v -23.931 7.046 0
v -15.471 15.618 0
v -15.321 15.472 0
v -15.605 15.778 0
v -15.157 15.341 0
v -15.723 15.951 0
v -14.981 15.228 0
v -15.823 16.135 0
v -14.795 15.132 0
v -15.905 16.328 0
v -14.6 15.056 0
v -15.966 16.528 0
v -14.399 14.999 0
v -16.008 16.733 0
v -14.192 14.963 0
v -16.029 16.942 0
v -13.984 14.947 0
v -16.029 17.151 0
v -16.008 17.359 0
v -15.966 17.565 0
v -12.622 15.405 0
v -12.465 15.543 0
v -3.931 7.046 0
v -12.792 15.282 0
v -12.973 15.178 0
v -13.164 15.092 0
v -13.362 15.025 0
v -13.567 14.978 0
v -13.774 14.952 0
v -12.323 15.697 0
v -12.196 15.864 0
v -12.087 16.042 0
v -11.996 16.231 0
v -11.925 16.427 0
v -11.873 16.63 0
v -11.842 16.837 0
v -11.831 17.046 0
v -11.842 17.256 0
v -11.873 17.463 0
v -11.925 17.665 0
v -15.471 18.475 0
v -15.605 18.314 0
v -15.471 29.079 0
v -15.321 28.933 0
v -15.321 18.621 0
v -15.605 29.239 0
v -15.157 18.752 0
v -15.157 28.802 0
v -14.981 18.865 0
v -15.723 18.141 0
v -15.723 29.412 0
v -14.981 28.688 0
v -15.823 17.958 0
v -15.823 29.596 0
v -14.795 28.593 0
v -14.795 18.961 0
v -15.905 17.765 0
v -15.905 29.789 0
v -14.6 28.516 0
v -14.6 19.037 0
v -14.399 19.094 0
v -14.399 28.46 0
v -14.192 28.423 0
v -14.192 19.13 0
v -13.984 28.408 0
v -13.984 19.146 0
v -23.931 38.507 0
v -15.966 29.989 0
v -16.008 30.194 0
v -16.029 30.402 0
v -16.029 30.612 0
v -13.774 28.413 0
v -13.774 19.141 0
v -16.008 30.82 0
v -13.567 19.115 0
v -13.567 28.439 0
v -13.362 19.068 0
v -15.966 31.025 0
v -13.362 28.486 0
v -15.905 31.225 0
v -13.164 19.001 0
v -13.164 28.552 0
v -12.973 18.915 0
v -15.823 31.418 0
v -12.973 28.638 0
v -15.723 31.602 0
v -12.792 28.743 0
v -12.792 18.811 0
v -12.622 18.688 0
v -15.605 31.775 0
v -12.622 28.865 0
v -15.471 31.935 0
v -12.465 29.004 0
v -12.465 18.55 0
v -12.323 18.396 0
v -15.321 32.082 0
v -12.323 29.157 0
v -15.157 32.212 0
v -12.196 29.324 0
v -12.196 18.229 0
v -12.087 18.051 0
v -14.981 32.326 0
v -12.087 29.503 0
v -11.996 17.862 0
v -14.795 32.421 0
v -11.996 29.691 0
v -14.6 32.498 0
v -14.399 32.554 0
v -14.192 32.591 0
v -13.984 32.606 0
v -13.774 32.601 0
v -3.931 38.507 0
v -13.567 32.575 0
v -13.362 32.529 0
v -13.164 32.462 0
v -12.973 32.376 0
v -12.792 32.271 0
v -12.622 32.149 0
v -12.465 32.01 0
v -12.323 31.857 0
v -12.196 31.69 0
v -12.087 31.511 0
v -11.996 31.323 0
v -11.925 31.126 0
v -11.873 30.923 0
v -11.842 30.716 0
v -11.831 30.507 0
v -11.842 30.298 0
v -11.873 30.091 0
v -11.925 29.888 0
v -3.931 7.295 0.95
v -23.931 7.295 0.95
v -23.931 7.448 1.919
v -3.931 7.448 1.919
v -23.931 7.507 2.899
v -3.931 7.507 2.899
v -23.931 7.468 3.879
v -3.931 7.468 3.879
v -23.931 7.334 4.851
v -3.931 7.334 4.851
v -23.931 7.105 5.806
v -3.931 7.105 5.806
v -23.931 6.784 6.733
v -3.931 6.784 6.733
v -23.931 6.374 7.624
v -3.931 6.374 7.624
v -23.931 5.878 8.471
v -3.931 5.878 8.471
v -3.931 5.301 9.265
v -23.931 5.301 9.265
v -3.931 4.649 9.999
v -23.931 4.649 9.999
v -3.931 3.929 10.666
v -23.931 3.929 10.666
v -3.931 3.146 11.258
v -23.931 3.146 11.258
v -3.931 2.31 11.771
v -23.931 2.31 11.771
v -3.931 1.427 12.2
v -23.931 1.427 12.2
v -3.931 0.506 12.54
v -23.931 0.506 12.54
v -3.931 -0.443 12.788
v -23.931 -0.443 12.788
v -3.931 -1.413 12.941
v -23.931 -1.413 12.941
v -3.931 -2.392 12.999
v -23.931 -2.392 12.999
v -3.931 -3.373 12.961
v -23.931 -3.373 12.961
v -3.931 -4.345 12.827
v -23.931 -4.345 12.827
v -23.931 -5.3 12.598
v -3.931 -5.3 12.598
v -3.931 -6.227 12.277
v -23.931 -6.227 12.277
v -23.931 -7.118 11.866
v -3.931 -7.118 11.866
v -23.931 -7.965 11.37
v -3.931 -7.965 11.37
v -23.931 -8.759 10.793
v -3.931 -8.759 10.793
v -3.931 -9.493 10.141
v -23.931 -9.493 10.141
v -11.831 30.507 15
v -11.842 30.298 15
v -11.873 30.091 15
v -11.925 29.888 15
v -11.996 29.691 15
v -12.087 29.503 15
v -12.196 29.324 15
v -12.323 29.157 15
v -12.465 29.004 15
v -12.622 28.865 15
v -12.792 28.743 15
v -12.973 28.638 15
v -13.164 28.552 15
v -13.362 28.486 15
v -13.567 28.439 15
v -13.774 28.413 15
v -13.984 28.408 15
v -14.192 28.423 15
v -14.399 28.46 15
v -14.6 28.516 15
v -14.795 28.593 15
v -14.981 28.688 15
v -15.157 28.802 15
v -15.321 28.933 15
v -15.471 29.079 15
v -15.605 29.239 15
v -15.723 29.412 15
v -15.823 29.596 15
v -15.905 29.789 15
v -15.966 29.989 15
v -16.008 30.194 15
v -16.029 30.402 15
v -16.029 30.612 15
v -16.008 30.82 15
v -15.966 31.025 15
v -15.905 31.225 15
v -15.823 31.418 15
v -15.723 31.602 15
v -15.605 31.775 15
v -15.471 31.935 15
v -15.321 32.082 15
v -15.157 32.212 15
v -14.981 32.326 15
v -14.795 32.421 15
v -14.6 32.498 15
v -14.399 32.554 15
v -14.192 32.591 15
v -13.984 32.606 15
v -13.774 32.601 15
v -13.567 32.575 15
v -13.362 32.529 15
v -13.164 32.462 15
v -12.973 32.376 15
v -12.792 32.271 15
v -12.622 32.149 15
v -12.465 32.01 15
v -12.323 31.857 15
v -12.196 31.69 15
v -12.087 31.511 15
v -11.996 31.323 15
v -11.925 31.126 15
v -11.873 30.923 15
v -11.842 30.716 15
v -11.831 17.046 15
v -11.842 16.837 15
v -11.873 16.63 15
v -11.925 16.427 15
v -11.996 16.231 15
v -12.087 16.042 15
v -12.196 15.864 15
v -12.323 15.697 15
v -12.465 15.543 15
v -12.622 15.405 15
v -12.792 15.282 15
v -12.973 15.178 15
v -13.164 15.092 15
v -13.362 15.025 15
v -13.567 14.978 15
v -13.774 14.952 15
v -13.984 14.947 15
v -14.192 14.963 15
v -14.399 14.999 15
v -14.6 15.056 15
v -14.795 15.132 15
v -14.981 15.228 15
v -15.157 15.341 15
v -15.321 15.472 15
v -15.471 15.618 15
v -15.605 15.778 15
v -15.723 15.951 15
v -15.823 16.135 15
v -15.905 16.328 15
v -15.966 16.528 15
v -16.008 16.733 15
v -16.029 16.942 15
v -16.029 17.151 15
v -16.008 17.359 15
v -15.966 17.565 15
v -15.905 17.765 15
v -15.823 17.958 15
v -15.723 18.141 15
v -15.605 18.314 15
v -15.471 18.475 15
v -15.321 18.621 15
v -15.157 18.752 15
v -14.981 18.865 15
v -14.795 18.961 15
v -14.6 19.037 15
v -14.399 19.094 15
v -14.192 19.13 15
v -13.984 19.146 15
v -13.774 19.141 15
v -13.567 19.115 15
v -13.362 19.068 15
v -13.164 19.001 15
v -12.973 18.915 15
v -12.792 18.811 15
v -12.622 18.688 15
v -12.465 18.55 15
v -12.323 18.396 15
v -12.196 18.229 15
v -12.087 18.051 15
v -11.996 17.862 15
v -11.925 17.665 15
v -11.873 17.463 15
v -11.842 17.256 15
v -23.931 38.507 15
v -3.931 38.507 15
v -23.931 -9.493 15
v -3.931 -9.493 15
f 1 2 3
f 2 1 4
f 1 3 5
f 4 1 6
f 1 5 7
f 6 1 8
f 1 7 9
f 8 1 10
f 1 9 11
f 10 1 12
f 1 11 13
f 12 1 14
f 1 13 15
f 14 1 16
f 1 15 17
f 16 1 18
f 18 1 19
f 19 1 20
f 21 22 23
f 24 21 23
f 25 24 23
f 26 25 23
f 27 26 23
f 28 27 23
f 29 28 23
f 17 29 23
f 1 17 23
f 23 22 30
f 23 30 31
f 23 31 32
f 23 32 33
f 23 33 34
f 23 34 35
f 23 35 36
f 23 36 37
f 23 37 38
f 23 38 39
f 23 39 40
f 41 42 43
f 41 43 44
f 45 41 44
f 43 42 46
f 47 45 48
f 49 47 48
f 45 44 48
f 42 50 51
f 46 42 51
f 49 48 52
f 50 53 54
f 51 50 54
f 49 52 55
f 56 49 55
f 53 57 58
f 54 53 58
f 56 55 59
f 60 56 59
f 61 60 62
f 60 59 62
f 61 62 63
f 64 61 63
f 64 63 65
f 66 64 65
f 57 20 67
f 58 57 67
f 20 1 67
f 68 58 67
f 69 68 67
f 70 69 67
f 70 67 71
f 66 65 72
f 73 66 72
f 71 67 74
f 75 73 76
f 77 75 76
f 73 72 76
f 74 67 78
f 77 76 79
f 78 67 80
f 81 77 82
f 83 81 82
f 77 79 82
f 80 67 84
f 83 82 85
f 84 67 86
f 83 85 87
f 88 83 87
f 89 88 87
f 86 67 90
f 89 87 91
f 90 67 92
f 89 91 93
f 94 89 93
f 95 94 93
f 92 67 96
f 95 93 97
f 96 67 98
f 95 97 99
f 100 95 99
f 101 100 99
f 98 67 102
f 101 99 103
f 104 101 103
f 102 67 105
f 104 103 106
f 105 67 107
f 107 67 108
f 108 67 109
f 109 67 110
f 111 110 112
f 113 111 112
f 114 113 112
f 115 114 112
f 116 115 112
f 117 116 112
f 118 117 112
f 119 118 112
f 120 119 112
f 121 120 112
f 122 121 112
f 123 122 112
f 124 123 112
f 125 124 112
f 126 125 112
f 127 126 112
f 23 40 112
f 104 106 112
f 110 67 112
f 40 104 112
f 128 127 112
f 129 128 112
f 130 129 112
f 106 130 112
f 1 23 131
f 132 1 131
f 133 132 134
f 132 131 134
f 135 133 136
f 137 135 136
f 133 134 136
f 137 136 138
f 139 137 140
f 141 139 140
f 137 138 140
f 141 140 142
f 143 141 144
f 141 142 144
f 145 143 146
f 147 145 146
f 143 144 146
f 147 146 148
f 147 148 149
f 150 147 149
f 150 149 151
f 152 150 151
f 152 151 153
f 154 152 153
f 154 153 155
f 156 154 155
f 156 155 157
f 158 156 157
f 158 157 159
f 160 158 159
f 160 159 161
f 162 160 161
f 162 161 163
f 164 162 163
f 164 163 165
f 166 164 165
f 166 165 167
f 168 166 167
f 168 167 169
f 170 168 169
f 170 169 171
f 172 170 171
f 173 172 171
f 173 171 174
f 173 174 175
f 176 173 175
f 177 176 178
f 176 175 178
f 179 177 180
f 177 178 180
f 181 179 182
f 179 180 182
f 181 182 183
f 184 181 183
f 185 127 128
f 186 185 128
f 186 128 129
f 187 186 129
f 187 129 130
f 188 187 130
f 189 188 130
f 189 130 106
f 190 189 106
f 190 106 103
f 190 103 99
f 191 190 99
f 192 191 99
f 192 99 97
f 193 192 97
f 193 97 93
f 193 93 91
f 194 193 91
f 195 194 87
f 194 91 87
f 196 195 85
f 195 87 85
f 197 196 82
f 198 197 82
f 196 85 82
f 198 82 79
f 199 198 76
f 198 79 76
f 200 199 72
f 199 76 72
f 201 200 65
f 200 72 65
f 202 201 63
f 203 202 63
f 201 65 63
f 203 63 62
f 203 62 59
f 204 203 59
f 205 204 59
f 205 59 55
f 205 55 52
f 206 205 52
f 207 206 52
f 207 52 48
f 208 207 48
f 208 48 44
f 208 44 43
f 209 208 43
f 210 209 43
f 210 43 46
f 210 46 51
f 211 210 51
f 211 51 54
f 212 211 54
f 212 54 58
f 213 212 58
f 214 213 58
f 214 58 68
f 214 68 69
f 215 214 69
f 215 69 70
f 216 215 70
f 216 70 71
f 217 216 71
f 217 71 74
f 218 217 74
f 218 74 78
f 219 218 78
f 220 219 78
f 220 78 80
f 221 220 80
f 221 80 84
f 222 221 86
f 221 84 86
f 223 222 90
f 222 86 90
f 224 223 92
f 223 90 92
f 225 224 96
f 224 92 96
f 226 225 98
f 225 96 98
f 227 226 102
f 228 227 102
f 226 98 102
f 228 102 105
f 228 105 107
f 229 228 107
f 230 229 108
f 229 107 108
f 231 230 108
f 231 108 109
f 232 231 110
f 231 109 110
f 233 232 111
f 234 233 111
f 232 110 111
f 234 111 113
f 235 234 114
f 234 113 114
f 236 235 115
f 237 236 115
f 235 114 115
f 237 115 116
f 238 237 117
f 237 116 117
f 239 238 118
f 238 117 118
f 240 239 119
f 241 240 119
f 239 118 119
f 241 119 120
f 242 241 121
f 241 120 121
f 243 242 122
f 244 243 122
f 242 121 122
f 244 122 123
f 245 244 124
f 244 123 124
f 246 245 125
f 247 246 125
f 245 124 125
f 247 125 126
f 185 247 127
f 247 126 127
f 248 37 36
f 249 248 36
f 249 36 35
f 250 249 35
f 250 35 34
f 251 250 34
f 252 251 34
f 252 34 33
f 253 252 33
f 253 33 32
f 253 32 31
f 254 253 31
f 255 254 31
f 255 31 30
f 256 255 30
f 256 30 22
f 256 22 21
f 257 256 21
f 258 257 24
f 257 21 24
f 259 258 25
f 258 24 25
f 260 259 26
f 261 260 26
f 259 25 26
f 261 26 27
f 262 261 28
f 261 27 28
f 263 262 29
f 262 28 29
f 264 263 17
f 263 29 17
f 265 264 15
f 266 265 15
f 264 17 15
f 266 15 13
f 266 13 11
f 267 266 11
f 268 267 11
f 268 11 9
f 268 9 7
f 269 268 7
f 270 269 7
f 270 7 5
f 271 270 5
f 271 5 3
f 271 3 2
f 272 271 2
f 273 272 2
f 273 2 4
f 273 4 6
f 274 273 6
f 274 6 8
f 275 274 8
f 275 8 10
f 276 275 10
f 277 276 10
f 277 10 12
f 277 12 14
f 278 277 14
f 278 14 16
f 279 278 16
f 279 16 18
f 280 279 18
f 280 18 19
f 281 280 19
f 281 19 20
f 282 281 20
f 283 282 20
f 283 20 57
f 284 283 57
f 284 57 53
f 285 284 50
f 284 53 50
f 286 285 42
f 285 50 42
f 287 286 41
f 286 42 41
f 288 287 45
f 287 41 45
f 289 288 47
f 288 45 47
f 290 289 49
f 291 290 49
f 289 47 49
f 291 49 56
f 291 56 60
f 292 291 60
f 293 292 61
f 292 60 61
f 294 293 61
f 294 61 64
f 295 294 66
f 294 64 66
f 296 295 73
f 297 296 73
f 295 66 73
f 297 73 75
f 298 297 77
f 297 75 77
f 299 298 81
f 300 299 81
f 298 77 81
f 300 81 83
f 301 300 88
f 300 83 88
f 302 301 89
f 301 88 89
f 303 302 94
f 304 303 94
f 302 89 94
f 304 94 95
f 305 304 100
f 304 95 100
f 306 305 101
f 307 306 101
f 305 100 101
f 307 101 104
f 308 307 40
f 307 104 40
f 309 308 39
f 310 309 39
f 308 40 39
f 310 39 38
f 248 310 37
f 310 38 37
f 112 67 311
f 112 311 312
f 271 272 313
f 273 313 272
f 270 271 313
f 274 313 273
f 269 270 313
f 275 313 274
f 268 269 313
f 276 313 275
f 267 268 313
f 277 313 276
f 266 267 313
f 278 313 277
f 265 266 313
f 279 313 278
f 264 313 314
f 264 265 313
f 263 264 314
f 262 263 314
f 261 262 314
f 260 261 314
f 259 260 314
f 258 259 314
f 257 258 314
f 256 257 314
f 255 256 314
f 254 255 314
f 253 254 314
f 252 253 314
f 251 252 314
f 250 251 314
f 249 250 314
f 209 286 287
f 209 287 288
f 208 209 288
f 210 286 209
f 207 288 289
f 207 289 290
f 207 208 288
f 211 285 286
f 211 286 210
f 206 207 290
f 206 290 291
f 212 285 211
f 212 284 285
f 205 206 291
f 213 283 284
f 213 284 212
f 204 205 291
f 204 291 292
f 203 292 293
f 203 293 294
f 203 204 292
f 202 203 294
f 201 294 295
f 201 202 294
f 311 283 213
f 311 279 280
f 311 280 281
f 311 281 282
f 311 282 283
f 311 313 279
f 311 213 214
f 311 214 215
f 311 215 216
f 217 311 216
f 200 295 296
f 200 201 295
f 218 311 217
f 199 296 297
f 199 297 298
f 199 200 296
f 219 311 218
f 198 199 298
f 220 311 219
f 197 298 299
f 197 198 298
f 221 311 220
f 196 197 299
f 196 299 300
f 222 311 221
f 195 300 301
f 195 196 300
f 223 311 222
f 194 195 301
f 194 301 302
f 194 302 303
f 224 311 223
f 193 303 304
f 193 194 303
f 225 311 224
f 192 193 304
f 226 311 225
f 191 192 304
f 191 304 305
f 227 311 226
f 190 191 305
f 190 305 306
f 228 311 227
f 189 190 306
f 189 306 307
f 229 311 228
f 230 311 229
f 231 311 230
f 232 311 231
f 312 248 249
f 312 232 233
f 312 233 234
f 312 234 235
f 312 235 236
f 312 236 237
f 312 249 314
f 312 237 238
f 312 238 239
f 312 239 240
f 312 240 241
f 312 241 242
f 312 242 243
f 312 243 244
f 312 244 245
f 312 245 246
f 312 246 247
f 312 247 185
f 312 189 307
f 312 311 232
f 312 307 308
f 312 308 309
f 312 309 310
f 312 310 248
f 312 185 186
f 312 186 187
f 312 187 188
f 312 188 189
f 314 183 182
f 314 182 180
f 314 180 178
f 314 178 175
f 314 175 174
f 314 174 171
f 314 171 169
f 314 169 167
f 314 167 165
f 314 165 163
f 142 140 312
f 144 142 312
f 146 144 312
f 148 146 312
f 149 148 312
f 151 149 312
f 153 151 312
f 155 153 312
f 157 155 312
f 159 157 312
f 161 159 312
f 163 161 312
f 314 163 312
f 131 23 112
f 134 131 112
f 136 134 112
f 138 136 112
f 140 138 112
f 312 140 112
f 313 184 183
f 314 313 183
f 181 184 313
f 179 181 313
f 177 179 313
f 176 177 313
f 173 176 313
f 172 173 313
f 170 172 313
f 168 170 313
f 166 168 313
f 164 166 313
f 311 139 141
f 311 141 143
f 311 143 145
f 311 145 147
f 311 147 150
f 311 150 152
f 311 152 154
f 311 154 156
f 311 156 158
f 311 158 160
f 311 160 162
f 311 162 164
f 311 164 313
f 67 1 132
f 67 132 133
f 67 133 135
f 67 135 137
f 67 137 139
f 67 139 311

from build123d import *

# Parameters (mm, degrees)
F0_W     = 20
F0_H     = 48
F1_DEPTH = 15
F2_R     = 10
F3_DEPTH = 25
F4_R     = 2.1
F5_DEPTH = 25


with BuildPart() as f1:
    # F0 (on Top) → F1 (new body)
    with BuildSketch(Plane.XY):
        with Locations((-13.931248, 14.507082)):
            Rectangle(F0_W, F0_H)
    extrude(amount=F1_DEPTH)

    # F2 (on Right) → F3 (cut)
    with BuildSketch(Plane.YZ):
        with Locations((-2.492918, 3)):
            Circle(F2_R)
    extrude(amount=-F3_DEPTH, mode=Mode.SUBTRACT)

    # F4 (on face) → F5 (cut)
    with BuildSketch(Plane(origin=(0, 0, 0), x_dir=(1, 0, 0), z_dir=(0, 0, -1))):
        with Locations((-13.931248, -30.507082)):
            Circle(F4_R)
        with Locations((-13.931248, -17.046474)):
            Circle(F4_R)
    extrude(amount=-F5_DEPTH, mode=Mode.SUBTRACT)


solid = f1.part
